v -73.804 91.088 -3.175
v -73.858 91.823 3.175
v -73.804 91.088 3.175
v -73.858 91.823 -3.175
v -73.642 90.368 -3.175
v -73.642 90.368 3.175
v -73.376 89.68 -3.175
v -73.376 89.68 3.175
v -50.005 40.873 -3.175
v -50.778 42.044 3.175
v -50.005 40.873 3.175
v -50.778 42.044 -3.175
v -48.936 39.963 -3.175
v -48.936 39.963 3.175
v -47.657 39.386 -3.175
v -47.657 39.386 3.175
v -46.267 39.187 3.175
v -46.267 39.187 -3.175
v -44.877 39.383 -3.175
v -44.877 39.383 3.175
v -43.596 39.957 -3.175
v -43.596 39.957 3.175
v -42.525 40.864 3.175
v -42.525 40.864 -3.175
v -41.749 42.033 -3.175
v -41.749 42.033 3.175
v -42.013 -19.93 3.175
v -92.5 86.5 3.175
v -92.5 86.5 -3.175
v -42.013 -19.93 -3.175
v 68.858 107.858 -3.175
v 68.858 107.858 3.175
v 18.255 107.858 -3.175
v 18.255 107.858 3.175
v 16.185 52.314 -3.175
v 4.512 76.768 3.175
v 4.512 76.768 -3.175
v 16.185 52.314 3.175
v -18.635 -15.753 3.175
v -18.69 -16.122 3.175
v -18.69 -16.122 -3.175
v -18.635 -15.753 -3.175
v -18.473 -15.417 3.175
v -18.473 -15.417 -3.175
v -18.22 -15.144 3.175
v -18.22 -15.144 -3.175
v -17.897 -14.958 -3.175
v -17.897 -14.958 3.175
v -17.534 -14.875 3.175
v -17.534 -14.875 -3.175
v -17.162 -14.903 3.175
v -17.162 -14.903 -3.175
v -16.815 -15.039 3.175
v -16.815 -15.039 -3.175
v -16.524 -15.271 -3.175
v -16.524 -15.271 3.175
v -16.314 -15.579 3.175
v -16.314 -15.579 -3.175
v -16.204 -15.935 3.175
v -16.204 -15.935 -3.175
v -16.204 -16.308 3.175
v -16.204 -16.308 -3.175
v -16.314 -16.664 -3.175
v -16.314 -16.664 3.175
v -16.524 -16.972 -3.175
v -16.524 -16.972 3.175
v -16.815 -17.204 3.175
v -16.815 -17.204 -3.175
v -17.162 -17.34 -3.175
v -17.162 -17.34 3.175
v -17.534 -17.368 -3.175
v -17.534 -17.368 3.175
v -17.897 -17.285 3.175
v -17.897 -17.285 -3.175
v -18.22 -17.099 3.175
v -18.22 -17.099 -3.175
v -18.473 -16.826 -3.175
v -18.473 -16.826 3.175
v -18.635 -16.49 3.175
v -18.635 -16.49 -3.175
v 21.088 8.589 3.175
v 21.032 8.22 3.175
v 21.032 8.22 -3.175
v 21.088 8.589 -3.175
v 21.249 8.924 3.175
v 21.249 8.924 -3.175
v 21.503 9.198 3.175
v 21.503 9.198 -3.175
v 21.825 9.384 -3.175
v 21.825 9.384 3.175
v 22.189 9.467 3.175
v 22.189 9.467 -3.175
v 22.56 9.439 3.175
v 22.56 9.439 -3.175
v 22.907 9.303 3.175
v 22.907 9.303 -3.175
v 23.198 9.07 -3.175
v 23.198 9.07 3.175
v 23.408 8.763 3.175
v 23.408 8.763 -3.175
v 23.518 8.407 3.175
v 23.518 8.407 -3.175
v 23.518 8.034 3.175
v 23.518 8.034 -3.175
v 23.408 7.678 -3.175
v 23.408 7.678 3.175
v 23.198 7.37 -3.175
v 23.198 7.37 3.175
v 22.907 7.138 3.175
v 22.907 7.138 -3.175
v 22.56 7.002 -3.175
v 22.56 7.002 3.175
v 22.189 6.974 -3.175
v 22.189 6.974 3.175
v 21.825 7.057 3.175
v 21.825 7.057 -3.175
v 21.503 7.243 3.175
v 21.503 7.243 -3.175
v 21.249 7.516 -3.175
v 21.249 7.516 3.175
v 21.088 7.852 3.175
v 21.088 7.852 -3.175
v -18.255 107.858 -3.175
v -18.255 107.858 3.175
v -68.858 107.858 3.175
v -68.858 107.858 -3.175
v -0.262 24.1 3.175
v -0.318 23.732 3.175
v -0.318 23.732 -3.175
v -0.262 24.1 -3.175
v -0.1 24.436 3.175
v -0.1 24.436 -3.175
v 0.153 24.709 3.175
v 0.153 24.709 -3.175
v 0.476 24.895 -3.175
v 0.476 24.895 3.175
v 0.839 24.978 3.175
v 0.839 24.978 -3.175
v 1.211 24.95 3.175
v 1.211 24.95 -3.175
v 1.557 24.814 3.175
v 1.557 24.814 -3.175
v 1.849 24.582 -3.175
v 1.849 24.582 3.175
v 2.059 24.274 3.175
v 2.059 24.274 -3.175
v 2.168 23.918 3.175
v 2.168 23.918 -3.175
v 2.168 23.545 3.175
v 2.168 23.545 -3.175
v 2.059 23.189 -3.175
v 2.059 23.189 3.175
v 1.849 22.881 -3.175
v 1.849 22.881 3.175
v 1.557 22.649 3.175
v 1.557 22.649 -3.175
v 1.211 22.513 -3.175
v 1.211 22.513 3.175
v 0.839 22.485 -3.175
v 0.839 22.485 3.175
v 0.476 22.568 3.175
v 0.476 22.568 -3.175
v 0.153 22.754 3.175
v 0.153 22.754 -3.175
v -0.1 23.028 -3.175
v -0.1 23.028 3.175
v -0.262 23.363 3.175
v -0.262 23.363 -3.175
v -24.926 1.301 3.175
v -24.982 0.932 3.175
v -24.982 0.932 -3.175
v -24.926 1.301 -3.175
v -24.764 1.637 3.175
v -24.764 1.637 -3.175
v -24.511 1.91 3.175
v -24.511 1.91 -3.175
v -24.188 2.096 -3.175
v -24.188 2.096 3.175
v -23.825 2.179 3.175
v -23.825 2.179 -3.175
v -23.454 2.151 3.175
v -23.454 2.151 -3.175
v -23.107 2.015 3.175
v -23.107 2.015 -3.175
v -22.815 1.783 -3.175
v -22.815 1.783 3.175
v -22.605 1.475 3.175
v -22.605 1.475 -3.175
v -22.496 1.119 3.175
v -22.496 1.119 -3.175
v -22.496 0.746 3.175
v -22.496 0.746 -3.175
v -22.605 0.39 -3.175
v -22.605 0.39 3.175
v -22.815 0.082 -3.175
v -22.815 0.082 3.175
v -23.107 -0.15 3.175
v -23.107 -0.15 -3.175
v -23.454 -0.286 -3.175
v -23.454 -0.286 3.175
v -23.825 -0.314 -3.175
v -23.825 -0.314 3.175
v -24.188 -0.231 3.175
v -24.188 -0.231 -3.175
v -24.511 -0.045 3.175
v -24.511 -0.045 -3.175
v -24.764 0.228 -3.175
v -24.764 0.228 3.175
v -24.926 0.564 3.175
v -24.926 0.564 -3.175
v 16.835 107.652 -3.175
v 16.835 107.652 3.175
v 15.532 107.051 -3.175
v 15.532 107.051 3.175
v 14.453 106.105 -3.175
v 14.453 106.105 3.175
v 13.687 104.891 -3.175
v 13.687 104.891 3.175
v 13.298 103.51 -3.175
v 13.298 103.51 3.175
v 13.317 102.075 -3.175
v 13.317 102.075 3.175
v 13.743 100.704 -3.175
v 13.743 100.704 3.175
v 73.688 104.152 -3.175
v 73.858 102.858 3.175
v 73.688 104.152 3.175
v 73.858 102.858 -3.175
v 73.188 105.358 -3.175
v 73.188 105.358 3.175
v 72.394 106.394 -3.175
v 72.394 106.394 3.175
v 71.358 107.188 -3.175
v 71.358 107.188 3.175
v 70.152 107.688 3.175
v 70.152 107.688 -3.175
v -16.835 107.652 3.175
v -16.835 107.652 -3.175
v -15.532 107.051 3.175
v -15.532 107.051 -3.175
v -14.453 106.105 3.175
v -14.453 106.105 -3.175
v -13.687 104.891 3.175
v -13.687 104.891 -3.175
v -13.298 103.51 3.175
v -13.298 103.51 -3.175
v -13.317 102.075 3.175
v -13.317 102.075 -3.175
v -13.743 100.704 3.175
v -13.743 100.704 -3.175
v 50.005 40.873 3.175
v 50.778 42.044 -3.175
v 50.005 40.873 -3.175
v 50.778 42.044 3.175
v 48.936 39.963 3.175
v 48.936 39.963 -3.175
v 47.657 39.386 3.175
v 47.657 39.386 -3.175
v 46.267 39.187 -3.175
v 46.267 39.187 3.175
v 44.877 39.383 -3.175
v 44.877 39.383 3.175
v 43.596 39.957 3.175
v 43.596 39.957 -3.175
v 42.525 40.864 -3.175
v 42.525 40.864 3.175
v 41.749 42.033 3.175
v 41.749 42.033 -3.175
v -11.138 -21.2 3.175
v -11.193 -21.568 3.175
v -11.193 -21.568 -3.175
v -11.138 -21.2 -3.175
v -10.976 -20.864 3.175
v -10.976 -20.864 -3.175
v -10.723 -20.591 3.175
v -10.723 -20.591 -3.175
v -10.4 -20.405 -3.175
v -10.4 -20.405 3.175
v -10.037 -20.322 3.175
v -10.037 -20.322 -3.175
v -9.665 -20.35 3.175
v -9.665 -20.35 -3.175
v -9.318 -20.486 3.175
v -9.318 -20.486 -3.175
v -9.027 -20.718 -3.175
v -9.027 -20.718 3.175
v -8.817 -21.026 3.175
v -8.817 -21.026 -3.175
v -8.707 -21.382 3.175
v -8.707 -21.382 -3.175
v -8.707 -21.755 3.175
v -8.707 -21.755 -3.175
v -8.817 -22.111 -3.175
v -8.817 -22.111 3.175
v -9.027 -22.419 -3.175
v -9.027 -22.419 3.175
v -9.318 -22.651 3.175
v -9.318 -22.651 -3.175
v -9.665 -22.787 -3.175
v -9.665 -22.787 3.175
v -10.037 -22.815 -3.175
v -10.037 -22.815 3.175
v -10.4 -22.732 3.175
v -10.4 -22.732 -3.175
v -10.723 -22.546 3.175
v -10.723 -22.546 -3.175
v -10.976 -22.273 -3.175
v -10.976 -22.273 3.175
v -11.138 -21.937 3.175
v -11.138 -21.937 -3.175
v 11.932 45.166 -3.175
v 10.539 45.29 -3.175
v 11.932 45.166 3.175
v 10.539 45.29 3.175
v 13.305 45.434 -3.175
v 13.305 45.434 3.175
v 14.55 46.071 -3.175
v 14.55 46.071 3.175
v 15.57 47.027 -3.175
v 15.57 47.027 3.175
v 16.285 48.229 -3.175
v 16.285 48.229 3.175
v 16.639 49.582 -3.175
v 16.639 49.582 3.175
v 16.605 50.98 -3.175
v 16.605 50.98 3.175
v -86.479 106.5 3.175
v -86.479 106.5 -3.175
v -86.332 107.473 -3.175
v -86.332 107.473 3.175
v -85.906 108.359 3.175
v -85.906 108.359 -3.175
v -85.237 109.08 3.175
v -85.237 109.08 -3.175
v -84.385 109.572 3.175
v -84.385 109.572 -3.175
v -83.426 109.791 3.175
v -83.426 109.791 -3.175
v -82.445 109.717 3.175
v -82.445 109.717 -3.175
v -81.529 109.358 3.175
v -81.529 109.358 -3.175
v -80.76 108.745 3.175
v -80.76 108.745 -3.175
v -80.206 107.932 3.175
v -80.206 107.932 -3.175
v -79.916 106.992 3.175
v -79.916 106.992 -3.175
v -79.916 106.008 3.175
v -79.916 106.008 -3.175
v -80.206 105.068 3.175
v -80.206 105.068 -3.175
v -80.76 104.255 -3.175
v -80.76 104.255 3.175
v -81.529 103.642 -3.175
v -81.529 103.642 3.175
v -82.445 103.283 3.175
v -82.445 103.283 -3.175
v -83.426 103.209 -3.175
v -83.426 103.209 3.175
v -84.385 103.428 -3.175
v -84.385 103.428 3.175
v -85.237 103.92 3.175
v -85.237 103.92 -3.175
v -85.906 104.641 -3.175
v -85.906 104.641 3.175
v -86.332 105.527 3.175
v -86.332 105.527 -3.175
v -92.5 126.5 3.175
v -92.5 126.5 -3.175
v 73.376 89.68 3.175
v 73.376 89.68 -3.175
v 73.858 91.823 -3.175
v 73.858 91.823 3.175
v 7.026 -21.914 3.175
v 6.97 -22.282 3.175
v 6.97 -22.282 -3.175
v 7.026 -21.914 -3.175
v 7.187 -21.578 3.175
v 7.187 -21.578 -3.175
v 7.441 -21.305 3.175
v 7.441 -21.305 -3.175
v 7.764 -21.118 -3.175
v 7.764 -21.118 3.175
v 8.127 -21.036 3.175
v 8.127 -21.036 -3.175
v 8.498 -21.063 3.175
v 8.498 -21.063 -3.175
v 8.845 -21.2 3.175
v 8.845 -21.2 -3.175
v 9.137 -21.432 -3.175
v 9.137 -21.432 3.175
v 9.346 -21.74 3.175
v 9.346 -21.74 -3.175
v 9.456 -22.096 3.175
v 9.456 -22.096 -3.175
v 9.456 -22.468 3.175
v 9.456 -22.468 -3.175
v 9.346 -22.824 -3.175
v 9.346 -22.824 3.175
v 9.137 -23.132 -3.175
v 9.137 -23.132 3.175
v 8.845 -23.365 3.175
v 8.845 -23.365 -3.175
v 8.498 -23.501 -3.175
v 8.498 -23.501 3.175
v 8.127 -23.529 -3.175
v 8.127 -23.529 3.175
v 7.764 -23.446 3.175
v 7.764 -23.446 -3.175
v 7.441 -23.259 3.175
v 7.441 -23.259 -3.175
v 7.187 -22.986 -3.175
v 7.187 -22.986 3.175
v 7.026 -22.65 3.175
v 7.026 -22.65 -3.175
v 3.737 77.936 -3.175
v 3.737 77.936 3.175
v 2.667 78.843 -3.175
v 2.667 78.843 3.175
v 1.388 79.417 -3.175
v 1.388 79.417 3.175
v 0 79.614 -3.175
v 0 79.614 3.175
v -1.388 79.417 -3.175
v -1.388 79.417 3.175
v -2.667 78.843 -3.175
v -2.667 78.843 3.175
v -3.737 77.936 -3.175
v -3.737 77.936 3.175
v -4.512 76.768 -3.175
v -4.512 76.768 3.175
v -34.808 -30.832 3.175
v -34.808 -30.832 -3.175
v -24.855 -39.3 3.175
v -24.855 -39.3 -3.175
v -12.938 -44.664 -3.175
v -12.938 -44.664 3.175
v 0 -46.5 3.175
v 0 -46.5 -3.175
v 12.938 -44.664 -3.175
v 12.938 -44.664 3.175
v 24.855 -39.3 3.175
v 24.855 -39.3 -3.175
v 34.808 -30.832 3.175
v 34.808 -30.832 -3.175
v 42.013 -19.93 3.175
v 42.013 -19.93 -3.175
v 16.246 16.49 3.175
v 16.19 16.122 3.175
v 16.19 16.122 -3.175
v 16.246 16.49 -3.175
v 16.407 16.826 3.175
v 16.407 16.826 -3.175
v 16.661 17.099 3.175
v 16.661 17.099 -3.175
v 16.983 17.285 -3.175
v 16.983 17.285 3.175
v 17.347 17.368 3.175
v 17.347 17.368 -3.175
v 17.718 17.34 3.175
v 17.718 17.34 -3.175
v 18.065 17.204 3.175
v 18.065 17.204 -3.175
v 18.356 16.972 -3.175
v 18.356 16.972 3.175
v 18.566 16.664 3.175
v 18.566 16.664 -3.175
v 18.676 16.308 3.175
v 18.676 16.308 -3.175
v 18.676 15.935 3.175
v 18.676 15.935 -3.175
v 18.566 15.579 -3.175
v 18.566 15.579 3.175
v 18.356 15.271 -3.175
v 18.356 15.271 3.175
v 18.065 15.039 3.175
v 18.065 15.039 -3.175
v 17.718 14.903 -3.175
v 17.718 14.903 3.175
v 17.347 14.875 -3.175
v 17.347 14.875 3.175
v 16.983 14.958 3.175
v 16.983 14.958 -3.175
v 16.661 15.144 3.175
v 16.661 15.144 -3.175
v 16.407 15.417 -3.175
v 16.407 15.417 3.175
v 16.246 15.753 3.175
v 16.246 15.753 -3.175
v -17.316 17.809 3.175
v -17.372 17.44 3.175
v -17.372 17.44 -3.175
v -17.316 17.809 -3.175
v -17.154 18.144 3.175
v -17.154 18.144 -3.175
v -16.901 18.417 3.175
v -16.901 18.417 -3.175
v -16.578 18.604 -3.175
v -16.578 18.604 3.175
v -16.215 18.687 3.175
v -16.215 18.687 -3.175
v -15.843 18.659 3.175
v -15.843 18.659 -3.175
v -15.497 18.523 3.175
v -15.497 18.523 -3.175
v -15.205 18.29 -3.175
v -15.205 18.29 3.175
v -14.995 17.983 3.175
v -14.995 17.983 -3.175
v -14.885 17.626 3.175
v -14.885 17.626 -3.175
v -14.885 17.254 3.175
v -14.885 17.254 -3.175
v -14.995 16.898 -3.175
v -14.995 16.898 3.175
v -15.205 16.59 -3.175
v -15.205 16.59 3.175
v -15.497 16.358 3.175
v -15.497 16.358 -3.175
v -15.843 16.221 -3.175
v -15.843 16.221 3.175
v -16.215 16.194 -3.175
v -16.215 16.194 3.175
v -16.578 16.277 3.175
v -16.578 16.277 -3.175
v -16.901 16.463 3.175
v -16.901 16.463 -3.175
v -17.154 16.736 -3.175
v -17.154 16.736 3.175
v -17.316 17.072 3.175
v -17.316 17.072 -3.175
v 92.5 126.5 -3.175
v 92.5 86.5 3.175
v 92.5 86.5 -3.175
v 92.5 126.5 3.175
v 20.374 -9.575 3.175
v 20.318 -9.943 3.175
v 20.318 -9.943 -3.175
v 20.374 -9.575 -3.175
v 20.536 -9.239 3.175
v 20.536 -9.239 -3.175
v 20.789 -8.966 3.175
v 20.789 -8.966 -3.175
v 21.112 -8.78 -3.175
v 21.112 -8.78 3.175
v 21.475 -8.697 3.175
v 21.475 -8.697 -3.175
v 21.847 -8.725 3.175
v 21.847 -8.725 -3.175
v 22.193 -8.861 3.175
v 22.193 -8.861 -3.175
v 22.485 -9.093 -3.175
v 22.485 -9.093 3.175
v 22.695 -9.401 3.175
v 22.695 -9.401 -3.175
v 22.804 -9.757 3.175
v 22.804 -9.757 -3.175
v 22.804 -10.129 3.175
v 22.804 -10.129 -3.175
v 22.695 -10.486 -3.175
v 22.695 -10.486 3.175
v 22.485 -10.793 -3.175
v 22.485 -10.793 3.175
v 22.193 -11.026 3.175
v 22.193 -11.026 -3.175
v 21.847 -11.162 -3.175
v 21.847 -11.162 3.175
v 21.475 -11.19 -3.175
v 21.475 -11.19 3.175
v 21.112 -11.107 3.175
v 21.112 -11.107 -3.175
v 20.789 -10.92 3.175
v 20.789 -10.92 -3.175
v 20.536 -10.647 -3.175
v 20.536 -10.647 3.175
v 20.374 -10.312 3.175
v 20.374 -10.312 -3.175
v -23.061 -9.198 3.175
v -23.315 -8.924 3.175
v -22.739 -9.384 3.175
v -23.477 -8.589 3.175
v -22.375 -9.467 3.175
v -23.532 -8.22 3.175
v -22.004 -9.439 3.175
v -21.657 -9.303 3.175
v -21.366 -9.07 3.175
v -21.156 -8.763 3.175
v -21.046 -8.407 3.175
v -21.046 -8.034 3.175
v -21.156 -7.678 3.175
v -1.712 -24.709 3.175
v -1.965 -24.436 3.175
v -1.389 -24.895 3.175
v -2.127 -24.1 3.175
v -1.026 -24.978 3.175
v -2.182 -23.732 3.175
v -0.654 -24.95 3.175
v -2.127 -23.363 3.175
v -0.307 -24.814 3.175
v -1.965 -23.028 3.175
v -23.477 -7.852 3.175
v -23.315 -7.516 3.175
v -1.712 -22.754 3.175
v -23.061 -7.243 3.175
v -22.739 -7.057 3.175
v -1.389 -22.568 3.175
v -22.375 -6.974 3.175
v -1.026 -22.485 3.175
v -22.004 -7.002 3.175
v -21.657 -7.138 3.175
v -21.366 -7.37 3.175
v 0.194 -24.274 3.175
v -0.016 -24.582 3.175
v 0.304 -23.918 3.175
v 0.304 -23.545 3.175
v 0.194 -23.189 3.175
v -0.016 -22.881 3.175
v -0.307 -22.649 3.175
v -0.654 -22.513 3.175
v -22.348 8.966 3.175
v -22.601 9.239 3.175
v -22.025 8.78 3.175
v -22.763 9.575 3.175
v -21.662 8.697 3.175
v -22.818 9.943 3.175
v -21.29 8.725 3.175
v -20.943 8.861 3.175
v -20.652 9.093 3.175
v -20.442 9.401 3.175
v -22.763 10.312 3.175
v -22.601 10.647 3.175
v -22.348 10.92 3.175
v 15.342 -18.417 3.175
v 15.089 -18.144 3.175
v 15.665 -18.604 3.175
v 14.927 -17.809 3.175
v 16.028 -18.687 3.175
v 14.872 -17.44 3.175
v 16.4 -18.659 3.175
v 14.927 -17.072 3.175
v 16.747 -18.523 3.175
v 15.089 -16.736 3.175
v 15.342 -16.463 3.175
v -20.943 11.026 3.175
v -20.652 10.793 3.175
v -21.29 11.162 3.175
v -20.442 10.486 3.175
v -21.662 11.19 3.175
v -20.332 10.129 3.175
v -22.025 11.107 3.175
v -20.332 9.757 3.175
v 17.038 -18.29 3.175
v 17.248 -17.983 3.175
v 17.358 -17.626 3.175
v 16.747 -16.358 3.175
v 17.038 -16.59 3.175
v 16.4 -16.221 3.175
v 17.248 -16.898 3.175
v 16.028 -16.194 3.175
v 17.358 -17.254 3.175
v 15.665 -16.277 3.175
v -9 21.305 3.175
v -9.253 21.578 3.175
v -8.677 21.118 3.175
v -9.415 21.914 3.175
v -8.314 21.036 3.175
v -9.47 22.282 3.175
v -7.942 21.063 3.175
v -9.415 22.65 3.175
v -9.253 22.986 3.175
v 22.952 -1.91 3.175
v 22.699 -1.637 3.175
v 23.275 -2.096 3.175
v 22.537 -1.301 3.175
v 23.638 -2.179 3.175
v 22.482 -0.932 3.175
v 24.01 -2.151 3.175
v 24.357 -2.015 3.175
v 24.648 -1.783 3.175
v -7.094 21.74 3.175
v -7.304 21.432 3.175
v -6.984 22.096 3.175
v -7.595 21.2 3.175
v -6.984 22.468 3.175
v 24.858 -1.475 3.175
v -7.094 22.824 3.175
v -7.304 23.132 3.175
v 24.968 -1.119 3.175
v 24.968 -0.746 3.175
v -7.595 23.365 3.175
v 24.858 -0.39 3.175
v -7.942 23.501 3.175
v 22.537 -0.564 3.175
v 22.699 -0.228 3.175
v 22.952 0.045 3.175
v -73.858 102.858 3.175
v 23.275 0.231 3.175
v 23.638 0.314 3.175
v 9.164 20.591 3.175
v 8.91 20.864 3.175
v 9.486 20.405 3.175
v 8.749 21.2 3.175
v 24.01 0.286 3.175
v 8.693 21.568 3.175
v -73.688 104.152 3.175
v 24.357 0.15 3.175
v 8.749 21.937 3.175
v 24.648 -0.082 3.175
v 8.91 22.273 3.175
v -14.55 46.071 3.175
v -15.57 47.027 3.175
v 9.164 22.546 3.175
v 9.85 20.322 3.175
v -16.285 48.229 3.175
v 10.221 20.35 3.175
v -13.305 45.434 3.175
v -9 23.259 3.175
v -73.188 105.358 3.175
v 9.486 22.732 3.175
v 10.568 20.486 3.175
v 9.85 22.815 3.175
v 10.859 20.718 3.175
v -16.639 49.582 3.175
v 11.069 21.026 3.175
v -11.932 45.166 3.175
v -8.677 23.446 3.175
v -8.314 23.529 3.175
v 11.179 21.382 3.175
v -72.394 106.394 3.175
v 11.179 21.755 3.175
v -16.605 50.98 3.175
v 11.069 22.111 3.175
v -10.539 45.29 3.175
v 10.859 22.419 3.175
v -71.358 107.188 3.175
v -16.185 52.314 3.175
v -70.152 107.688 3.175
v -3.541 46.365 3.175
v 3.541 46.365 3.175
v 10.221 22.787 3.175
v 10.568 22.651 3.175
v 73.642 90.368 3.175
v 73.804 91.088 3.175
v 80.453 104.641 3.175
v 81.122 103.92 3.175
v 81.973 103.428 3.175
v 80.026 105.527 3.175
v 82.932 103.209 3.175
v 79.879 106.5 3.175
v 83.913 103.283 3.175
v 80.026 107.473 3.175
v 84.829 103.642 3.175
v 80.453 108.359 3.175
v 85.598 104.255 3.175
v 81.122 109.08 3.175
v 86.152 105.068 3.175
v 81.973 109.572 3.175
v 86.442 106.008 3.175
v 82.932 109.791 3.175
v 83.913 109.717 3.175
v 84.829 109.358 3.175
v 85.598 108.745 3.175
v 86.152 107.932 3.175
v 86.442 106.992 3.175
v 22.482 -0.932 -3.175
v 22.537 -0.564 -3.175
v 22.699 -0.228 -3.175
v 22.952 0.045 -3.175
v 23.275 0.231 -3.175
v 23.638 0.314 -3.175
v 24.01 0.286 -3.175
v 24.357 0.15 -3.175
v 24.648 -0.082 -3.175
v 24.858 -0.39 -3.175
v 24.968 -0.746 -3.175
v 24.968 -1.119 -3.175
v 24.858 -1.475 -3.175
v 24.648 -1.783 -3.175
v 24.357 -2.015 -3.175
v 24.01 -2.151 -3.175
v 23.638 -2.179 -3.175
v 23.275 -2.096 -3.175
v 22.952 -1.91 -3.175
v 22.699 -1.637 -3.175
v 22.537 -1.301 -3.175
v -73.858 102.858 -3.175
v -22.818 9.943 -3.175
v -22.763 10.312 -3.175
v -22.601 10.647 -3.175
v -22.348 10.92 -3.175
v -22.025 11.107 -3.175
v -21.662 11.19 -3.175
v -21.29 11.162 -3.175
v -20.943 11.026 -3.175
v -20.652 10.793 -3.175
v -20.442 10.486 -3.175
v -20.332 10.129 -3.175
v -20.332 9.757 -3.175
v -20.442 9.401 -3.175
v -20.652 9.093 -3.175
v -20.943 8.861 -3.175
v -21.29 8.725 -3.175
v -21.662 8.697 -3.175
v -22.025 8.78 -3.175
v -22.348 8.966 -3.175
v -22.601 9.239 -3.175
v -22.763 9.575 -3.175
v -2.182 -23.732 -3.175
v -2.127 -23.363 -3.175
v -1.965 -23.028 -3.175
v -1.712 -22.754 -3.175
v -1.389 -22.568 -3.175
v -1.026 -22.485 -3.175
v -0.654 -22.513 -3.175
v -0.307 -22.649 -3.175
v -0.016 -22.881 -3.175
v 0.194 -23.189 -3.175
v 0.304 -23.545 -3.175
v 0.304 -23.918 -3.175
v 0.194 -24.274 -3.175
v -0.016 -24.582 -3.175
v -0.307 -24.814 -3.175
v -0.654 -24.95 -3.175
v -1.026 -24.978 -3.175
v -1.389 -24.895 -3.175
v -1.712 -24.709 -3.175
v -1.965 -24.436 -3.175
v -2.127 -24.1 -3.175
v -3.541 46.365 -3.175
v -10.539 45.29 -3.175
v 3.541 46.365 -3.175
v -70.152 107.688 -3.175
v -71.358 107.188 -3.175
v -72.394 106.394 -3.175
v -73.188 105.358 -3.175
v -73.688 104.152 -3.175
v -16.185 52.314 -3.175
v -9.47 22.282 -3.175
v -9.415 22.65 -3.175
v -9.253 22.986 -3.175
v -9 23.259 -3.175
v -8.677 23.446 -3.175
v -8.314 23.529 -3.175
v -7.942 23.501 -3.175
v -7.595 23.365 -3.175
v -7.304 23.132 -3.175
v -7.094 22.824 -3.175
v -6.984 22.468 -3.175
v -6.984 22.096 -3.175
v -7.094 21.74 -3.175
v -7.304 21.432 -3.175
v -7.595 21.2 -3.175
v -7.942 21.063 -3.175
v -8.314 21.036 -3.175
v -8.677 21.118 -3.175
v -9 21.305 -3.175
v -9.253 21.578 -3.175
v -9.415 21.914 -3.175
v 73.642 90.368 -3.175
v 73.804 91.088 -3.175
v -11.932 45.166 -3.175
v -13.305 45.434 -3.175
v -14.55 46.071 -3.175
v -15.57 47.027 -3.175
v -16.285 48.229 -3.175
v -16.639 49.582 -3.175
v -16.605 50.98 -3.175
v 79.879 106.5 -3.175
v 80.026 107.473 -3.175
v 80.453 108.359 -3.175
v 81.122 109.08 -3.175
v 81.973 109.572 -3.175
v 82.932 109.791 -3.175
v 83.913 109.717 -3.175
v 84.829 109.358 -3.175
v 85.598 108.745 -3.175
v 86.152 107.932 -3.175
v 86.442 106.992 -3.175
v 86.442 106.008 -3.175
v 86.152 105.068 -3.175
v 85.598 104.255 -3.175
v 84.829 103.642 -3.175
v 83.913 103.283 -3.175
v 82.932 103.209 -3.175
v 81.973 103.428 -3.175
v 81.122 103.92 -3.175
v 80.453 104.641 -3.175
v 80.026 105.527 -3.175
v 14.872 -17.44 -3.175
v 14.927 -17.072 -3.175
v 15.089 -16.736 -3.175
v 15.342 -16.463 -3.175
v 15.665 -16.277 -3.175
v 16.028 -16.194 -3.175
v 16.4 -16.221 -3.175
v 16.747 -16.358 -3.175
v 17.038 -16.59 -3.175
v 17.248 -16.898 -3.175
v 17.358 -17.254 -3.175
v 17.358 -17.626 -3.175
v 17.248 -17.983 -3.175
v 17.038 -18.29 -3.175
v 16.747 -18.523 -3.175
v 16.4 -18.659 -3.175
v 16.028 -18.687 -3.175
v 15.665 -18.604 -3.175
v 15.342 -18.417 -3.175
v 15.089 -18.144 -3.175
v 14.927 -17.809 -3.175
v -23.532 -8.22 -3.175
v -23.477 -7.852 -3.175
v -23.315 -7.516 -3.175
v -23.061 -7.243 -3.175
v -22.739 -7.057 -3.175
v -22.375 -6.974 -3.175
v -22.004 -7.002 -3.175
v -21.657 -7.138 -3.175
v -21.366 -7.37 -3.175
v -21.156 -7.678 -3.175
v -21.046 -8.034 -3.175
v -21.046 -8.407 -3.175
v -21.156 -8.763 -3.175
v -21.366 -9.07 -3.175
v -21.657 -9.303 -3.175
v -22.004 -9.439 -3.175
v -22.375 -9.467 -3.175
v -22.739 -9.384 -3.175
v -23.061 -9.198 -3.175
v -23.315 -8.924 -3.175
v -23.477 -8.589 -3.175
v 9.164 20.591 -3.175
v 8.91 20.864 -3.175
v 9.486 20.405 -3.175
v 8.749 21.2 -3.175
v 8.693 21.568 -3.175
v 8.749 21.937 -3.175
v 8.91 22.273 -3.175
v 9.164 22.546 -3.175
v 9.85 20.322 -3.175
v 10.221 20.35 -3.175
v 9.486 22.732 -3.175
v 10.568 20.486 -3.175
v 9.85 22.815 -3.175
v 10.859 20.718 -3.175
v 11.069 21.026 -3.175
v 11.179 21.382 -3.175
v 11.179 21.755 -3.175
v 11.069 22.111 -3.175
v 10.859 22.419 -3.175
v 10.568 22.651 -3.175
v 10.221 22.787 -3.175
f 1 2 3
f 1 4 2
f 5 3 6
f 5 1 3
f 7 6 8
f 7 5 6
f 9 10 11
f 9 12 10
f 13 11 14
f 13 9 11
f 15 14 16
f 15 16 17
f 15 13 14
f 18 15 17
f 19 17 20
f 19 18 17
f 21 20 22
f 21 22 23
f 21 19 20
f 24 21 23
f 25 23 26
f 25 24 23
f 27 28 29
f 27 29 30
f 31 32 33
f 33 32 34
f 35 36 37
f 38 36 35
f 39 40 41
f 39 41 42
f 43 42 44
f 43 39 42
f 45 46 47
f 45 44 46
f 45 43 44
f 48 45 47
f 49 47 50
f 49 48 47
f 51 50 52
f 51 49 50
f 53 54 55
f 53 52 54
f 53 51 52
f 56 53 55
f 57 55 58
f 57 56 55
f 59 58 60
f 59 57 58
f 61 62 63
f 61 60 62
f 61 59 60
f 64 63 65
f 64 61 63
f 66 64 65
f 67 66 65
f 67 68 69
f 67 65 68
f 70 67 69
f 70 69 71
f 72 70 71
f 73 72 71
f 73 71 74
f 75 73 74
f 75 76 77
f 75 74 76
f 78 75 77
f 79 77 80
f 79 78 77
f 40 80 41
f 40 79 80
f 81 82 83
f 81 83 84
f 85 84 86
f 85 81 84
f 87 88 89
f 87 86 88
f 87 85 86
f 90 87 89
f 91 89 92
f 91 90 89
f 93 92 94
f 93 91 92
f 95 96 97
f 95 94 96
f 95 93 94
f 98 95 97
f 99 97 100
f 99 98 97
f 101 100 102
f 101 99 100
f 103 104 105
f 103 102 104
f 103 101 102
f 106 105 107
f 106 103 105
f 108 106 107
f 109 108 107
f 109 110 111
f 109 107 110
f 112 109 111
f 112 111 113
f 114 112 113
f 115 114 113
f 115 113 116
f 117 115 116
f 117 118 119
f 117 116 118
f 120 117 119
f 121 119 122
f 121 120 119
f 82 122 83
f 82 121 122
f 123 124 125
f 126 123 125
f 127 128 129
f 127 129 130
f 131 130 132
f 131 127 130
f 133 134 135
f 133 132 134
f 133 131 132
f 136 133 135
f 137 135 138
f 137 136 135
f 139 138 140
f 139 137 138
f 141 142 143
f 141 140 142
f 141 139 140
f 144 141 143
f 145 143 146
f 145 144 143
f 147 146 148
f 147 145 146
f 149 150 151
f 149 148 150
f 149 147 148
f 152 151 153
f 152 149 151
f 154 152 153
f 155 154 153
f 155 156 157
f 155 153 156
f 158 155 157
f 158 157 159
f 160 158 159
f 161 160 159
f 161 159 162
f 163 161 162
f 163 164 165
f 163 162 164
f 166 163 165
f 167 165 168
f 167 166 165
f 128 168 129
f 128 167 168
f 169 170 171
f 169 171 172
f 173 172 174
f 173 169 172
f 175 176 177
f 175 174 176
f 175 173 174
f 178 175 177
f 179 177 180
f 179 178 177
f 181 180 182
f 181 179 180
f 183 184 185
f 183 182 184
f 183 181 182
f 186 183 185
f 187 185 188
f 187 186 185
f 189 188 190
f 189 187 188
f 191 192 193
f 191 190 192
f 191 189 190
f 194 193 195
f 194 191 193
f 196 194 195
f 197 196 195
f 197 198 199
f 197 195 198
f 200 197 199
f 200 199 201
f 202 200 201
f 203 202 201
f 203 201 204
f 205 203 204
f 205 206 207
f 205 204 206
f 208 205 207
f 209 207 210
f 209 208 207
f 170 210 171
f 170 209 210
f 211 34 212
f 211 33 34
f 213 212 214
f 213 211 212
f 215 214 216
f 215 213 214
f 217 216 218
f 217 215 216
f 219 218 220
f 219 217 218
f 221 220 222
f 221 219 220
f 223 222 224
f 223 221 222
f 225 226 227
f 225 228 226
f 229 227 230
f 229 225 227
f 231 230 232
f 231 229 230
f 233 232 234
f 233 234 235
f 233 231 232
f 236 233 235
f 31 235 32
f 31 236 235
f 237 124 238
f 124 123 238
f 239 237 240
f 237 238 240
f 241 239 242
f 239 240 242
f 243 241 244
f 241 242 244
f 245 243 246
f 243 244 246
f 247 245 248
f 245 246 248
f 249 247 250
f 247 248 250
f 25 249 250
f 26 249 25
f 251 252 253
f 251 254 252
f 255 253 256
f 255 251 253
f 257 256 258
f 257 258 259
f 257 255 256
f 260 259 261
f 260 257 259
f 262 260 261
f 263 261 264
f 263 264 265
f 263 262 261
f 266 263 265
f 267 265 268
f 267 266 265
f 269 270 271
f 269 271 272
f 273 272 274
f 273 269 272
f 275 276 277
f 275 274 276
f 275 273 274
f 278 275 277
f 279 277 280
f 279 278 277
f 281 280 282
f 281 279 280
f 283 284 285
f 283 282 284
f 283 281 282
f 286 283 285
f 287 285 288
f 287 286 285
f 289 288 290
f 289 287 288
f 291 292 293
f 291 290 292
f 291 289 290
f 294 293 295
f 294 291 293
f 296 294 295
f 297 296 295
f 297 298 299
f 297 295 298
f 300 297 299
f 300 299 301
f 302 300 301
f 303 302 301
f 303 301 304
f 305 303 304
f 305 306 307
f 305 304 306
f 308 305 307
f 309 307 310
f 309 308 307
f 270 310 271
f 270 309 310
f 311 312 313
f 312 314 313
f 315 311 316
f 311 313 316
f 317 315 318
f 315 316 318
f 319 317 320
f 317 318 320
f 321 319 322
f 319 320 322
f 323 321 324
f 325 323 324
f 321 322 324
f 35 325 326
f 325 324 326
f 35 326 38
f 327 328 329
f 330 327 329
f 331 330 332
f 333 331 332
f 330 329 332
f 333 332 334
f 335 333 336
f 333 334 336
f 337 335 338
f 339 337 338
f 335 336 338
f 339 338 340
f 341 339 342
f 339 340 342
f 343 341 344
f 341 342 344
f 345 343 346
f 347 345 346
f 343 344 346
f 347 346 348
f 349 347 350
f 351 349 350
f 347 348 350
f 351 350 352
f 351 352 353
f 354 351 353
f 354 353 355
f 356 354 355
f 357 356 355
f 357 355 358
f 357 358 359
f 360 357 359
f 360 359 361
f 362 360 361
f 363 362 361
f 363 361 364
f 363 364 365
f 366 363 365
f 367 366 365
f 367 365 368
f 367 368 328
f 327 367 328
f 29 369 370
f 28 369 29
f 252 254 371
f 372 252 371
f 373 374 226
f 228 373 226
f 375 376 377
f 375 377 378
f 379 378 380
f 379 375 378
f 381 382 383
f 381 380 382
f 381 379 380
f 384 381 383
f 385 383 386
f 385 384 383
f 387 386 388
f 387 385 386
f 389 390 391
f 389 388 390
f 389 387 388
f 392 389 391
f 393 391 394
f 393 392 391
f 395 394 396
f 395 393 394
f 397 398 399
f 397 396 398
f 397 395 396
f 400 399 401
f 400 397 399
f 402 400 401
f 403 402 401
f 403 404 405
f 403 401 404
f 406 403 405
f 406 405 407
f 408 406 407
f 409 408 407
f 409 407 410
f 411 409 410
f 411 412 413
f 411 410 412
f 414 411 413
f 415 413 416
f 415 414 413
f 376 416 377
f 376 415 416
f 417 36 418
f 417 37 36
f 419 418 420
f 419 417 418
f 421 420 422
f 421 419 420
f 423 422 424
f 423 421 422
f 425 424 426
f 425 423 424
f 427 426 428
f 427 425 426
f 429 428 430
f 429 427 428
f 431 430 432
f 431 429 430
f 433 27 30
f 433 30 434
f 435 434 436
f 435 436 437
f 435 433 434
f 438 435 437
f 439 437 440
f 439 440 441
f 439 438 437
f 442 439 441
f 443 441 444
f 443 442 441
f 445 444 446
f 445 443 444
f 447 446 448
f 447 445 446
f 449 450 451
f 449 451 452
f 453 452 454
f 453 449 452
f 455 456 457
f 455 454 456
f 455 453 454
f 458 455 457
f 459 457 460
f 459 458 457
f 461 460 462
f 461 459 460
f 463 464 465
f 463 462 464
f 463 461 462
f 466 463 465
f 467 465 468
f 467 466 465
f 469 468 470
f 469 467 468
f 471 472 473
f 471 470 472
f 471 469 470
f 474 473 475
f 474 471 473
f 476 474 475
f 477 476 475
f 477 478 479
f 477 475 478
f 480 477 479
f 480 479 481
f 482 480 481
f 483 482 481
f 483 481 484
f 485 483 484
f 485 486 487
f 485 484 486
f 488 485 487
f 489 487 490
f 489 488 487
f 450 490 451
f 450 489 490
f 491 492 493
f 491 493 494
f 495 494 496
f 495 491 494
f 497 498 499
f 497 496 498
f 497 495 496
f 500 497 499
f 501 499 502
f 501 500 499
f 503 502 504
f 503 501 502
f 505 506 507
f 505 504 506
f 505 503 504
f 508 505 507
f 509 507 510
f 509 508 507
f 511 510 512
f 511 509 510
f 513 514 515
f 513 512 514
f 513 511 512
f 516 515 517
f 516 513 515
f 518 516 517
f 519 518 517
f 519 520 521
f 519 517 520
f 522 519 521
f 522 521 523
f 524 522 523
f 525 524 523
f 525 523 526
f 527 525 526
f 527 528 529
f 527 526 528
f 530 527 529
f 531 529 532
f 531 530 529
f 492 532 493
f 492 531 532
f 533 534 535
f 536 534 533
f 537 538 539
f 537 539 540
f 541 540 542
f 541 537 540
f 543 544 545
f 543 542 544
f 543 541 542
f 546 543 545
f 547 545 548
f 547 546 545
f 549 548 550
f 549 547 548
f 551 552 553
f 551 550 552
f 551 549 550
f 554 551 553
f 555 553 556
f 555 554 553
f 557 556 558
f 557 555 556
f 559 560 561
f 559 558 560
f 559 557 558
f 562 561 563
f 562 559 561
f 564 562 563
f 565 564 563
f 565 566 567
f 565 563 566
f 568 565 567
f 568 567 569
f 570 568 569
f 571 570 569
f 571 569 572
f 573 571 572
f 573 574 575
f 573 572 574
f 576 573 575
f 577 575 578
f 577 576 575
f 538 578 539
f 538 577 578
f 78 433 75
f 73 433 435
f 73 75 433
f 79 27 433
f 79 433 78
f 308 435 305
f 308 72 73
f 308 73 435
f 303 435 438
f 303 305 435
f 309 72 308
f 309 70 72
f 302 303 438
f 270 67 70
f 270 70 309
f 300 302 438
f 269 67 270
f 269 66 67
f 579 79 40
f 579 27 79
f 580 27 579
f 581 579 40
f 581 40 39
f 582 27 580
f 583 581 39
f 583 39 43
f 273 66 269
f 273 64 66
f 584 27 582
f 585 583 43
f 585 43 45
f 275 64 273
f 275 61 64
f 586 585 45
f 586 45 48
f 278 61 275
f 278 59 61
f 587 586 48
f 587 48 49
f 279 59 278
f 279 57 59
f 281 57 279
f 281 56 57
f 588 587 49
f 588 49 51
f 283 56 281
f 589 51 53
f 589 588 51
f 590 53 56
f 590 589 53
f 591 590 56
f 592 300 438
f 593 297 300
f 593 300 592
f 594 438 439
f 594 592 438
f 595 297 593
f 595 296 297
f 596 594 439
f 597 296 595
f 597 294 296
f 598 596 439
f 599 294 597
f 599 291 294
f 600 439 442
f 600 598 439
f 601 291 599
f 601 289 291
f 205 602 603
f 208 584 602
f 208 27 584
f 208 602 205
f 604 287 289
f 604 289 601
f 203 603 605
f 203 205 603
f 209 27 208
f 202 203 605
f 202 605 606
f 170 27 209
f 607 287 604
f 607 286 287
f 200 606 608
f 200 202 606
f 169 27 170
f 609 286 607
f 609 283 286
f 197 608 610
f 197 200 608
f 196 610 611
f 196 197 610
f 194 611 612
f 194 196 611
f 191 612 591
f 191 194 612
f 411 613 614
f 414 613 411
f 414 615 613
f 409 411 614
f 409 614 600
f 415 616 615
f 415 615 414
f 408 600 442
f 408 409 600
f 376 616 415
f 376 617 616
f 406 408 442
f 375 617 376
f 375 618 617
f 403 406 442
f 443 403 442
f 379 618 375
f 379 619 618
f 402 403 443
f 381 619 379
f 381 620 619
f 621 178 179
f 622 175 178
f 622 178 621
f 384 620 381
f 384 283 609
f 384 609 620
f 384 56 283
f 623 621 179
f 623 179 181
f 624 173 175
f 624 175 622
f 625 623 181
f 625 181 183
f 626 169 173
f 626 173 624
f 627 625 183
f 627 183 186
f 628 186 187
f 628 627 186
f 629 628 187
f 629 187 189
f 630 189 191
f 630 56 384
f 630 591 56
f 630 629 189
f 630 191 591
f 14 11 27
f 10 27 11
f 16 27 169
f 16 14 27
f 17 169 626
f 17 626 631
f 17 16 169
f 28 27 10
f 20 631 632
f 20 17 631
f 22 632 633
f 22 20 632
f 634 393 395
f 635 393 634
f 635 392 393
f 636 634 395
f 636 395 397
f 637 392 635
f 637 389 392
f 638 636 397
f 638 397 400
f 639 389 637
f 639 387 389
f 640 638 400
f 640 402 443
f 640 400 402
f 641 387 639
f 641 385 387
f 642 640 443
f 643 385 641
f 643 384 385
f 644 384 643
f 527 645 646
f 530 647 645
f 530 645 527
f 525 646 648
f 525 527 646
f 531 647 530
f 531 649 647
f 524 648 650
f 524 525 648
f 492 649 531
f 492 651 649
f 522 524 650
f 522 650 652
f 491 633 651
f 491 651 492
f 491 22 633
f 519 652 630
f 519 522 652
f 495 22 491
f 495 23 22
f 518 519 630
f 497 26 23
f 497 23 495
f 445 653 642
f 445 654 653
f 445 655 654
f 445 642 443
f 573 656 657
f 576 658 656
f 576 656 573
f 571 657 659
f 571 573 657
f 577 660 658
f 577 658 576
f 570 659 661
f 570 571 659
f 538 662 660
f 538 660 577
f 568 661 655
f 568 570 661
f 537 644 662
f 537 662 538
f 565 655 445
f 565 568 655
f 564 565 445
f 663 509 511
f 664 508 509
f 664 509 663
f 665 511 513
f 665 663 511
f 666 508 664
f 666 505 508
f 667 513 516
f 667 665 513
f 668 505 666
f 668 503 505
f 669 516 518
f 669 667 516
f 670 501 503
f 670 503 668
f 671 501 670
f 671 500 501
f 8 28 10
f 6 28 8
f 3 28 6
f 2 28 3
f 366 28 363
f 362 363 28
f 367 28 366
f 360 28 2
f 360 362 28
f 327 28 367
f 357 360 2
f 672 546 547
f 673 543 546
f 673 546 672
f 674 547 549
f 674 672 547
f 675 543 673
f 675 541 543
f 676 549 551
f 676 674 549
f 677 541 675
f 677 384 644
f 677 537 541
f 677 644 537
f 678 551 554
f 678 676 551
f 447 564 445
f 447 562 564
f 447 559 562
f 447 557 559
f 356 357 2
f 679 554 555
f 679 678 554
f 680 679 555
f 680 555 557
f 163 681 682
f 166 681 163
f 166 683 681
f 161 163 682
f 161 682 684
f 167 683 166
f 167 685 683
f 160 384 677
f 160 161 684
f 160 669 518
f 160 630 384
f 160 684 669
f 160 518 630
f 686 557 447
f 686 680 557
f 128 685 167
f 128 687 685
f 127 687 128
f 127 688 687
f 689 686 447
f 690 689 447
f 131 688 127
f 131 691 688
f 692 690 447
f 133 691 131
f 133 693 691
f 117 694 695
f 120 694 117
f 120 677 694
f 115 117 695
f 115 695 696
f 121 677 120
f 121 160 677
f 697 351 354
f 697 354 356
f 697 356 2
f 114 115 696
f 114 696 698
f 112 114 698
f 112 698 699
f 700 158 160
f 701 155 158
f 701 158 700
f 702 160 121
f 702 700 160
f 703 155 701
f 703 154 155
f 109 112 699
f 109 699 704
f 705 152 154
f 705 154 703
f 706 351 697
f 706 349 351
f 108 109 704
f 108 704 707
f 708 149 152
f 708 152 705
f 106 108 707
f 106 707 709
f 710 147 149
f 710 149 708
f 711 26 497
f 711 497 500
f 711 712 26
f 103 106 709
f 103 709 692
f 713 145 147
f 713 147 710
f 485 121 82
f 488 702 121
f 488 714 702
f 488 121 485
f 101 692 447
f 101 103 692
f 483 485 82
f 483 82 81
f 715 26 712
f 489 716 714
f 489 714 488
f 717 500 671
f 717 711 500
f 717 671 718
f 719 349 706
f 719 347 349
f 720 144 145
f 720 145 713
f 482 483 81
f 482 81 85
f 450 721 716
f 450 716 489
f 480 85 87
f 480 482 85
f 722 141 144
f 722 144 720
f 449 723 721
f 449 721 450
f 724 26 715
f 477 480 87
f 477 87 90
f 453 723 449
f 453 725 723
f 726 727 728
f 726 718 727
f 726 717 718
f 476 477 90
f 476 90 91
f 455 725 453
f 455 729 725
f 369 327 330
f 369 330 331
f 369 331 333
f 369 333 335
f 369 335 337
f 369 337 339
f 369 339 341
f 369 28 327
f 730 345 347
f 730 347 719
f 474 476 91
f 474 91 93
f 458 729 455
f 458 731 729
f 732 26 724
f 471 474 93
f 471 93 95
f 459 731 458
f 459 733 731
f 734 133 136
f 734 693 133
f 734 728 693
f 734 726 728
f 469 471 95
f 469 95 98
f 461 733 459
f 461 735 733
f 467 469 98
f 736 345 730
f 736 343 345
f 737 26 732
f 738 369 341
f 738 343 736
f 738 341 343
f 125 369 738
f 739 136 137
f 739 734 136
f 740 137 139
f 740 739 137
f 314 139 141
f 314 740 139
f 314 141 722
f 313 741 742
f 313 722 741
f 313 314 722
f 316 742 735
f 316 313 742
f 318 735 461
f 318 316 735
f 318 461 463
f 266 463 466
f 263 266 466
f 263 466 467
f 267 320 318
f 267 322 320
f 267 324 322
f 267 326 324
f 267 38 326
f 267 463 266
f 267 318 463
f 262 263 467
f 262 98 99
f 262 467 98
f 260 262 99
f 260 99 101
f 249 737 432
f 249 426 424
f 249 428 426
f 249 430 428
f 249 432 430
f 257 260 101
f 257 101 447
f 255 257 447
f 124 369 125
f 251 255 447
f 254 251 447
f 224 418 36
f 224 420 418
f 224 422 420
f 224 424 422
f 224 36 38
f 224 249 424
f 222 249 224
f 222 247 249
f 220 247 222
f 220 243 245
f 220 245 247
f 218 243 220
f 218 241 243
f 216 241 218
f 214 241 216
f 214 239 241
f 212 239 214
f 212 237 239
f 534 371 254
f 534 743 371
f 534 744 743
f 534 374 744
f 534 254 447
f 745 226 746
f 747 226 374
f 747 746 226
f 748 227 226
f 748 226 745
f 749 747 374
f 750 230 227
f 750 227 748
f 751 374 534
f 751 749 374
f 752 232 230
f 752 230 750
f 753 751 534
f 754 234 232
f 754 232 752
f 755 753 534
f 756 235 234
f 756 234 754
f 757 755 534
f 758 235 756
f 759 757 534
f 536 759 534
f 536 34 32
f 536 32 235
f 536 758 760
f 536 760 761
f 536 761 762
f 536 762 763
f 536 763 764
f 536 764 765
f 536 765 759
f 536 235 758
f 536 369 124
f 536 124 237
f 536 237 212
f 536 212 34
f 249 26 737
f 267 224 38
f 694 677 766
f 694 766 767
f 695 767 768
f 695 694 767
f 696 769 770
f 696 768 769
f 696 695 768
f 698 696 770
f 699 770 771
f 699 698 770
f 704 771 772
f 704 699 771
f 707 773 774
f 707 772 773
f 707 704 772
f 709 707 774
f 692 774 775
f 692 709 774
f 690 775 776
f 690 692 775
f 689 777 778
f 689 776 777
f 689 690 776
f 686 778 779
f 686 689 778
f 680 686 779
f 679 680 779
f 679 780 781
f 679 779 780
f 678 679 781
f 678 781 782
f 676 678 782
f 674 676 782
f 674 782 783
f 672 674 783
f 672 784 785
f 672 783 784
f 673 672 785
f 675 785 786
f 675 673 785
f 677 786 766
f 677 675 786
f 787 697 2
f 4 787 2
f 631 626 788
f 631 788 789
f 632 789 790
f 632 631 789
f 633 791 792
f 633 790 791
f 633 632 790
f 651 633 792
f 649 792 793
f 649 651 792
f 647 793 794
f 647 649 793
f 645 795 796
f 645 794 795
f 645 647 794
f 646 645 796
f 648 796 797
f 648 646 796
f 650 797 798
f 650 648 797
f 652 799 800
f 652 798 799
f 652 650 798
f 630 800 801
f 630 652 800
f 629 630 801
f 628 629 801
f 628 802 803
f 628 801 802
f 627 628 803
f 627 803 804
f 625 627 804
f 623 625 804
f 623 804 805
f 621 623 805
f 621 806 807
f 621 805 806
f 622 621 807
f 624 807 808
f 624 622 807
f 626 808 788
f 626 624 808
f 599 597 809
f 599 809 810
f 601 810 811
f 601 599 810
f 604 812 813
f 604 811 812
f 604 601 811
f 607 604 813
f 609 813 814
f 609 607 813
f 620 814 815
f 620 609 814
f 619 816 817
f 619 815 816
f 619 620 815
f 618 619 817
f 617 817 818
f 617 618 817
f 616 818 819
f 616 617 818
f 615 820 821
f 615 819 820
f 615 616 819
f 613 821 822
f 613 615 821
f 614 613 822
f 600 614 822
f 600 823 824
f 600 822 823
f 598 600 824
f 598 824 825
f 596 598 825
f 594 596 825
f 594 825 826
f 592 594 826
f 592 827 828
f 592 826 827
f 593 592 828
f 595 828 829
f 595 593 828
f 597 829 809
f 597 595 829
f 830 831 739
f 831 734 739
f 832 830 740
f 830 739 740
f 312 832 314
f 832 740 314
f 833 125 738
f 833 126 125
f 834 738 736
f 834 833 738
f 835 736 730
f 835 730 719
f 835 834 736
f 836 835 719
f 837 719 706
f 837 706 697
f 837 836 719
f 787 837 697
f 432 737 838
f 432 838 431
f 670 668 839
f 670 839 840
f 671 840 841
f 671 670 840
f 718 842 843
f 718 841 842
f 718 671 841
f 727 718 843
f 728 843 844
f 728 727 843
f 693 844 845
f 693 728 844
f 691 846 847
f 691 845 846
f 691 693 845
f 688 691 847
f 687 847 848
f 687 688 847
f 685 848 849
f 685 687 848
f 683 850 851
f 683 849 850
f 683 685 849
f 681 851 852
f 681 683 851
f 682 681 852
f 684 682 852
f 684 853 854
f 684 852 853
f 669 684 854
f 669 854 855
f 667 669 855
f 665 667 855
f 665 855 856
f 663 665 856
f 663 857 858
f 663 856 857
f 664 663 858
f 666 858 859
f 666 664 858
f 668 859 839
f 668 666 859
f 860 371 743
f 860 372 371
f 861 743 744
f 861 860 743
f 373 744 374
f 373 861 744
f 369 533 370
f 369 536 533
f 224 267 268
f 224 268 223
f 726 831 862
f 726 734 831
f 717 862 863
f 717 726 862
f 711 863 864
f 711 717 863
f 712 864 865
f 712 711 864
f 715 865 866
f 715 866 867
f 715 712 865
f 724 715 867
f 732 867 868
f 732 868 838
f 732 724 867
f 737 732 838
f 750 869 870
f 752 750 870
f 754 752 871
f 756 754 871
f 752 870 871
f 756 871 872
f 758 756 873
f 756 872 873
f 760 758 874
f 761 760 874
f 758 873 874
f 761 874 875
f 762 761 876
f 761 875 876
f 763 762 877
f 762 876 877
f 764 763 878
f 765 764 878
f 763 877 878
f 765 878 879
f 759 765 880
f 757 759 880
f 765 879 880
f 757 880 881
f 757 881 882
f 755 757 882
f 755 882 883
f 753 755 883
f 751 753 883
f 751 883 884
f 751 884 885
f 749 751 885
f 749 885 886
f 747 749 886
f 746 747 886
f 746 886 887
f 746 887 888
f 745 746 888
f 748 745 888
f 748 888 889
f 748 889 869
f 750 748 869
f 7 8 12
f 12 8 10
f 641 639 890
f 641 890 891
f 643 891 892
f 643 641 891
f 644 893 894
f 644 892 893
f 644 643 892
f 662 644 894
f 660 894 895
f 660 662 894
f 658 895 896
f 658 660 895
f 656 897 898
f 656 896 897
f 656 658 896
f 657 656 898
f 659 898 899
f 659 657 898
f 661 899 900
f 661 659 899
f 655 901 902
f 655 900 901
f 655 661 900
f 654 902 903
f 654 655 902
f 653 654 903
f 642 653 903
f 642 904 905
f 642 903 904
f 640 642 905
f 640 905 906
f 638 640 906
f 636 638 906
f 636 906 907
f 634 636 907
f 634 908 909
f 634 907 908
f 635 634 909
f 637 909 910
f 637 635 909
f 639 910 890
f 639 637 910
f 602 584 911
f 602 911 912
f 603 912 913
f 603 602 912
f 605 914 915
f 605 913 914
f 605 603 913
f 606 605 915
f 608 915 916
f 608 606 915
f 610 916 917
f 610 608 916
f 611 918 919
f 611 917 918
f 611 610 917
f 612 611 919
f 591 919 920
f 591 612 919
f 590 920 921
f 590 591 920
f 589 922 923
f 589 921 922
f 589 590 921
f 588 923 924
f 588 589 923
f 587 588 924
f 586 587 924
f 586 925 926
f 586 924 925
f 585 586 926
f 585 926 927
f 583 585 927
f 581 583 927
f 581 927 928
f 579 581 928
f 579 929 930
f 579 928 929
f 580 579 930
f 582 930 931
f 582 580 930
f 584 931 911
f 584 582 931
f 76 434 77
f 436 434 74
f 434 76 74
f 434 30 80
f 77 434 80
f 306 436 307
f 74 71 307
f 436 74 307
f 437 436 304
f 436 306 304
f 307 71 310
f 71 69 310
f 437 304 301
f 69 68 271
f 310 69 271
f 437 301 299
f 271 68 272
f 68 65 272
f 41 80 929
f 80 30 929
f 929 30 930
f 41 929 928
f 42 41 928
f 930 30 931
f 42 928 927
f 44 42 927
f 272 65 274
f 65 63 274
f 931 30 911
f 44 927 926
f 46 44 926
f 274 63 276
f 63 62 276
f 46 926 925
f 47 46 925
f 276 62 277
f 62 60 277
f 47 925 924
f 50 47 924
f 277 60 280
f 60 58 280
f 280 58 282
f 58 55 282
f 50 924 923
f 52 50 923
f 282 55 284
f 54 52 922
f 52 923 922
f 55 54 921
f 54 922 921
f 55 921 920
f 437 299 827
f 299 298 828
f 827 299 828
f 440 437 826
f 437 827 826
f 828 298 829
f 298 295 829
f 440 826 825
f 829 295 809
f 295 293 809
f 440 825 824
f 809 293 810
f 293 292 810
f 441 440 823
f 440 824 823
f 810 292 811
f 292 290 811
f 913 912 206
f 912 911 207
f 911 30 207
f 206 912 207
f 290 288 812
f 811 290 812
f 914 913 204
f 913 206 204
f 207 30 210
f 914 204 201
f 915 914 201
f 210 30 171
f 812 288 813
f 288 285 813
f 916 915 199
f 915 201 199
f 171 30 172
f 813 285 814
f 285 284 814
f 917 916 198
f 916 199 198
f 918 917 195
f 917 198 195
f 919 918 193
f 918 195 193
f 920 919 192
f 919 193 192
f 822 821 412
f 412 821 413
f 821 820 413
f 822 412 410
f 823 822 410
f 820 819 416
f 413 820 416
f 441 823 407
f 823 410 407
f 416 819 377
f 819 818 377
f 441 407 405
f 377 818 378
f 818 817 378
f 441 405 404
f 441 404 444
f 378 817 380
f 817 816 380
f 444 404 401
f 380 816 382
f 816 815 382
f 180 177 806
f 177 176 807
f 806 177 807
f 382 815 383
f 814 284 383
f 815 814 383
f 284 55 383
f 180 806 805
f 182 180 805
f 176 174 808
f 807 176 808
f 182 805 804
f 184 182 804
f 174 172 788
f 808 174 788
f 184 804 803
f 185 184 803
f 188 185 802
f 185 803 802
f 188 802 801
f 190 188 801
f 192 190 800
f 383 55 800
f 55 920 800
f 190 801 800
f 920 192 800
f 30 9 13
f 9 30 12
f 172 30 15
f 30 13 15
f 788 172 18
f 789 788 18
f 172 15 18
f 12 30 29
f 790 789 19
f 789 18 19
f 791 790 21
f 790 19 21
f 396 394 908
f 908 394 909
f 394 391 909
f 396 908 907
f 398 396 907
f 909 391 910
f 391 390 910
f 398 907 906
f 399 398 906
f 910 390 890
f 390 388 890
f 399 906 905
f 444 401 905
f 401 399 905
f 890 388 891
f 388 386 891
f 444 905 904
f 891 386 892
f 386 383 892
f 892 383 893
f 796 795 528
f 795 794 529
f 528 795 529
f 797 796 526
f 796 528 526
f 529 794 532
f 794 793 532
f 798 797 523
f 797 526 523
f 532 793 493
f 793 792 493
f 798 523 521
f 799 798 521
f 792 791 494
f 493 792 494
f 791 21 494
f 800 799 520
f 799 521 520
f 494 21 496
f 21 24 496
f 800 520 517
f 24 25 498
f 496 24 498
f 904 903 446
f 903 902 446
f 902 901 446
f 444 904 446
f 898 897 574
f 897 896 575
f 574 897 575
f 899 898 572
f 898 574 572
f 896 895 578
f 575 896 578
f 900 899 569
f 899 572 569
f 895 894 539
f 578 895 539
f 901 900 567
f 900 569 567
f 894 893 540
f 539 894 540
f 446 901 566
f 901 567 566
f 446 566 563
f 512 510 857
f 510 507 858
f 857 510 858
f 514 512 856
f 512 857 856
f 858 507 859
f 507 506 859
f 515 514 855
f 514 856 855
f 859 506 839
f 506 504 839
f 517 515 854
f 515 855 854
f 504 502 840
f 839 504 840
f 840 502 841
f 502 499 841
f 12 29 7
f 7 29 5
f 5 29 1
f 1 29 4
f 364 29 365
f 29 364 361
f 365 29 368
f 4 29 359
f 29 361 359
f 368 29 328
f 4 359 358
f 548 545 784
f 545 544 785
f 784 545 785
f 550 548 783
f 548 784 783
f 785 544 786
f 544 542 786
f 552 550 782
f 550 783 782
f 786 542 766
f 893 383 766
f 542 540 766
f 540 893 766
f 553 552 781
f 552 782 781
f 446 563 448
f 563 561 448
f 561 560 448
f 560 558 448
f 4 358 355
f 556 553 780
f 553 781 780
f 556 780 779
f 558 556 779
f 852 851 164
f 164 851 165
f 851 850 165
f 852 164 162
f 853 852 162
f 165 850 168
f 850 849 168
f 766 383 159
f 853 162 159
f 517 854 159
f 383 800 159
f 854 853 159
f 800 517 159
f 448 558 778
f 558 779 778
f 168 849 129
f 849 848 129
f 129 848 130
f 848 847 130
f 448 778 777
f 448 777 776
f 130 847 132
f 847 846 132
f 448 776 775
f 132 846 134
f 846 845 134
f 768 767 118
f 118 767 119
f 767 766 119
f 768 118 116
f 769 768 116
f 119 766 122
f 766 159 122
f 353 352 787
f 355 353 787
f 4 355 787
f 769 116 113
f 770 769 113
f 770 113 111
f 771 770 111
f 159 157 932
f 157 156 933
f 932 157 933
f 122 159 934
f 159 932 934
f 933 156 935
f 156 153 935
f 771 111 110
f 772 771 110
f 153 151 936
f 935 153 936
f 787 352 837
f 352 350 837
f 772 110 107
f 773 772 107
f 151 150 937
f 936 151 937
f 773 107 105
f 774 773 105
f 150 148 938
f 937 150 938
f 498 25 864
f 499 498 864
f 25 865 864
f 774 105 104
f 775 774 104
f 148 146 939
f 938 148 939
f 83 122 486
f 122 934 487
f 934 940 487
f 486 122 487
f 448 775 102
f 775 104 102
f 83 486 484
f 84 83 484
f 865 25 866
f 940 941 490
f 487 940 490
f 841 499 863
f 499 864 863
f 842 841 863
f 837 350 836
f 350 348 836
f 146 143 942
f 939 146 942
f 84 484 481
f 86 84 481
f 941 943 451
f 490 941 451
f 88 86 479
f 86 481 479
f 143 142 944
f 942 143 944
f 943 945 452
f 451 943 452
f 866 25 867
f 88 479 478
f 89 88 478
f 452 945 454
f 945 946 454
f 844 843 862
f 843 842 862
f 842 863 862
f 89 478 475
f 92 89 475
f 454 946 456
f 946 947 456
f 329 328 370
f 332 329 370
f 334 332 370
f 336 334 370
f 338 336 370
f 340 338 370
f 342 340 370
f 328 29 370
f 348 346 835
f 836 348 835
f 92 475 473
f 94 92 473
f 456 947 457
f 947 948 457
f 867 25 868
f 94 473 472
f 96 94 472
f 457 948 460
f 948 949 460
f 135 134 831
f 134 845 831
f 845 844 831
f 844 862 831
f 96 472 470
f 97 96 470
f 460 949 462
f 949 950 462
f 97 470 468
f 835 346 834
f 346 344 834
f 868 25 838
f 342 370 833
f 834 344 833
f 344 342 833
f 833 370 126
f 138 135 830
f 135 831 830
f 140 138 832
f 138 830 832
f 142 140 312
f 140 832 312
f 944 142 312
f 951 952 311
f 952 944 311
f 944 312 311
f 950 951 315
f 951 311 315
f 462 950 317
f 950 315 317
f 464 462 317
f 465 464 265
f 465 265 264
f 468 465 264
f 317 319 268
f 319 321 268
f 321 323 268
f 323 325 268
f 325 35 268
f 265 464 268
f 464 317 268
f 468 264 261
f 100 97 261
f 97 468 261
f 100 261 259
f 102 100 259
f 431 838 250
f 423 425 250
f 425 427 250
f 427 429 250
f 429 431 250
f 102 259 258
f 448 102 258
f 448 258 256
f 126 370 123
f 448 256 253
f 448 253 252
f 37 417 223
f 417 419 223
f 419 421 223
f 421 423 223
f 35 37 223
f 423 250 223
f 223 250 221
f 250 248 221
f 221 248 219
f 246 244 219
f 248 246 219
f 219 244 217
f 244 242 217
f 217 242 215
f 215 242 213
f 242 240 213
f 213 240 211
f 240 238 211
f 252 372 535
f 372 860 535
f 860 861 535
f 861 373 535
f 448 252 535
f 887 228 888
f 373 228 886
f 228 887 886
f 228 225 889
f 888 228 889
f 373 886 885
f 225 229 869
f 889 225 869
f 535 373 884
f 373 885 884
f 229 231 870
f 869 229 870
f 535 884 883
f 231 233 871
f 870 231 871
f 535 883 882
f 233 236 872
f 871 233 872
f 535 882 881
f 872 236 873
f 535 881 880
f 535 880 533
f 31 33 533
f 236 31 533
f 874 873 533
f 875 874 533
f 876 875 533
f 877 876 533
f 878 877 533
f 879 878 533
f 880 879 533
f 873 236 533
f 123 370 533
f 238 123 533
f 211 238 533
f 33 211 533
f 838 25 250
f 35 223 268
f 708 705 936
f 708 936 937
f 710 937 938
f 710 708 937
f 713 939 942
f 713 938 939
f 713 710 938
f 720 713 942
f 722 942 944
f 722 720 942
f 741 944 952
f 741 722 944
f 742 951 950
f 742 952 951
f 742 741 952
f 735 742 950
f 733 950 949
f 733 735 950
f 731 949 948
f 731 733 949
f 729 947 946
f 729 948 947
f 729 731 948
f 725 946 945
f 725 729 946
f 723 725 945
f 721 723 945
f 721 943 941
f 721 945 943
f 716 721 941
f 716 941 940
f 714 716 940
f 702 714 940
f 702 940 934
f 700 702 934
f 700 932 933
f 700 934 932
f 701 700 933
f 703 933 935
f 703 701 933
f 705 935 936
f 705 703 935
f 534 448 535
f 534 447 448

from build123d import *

# Parameters (mm, degrees)
BOSS_EXTRUDE1_DEPTH     = 3.175
CUT_EXTRUDE2_DEPTH      = 157.840117636
CUT_EXTRUDE2_DEPTH_BACK = 157.840117636
SKETCH3_R               = 1.25
CUT_EXTRUDE3_DEPTH      = 157.840117636
CUT_EXTRUDE3_DEPTH_BACK = 157.840117636
BOSS_EXTRUDE2_DEPTH     = 6.35
FILLET1_R               = 5
M6_CLEARANCE_HOLE1_D    = 6.6


with BuildPart() as part:
    # Sketch1 → Boss-Extrude1 (new, symmetric)
    with BuildSketch(Plane.XY):
        with BuildLine():
            Line((92.5, 126.5), (-92.5, 126.5))
            Line((-92.5, 126.5), (-92.5, 86.5))
            Line((-92.5, 86.5), (-42.012601066, -19.929660099))
            ThreePointArc((-42.012601066, -19.929660099), (0, -46.5), (42.012601066, -19.929660099))
            Line((42.012601066, -19.929660099), (92.5, 86.5))
            Line((92.5, 86.5), (92.5, 126.5))
        make_face()
    extrude(amount=BOSS_EXTRUDE1_DEPTH, both=True)

    # Sketch3 → Cut-Extrude2 (cut, two sides: drawn at the far end of the back side and taken through both)
    with BuildSketch(Plane(origin=(0, 0, -3.175), x_dir=(-1, 0, 0), z_dir=(0, 0, -1)).offset(-CUT_EXTRUDE2_DEPTH_BACK)):
        with Locations((17.440159599, -16.121517706)):
            Circle(SKETCH3_R)
        with Locations((22.282044228, -8.220280106)):
            Circle(SKETCH3_R)
        with Locations((9.943168767, -21.568400378)):
            Circle(SKETCH3_R)
        with Locations((0.932420624, -23.731689611)):
            Circle(SKETCH3_R)
        with Locations((-8.220280106, -22.282044228)):
            Circle(SKETCH3_R)
        with Locations((-16.121517706, -17.440159599)):
            Circle(SKETCH3_R)
        with Locations((-21.568400378, -9.943168767)):
            Circle(SKETCH3_R)
        with Locations((-23.731689611, -0.932420624)):
            Circle(SKETCH3_R)
        with Locations((-22.282044228, 8.220280106)):
            Circle(SKETCH3_R)
        with Locations((-17.440159599, 16.121517706)):
            Circle(SKETCH3_R)
        with Locations((-9.943168767, 21.568400378)):
            Circle(SKETCH3_R)
        with Locations((-0.932420624, 23.731689611)):
            Circle(SKETCH3_R)
        with Locations((8.220280106, 22.282044228)):
            Circle(SKETCH3_R)
        with Locations((16.121517706, 17.440159599)):
            Circle(SKETCH3_R)
        with Locations((21.568400378, 9.943168767)):
            Circle(SKETCH3_R)
        with Locations((23.731689611, 0.932420624)):
            Circle(SKETCH3_R)
    extrude(amount=CUT_EXTRUDE2_DEPTH + CUT_EXTRUDE2_DEPTH_BACK, mode=Mode.SUBTRACT)

    # Sketch4 → Cut-Extrude3 (cut, two sides: drawn at the far end of the back side and taken through both)
    with BuildSketch(Plane(origin=(0, 0, -3.175), x_dir=(-1, 0, 0), z_dir=(0, 0, -1)).offset(-CUT_EXTRUDE3_DEPTH_BACK)):
        with BuildLine():
            Line((-41.126950817, 21.698477285), (-73.85821292, 90.697419076))
            Line((-73.85821292, 90.697419076), (-73.85821292, 107.85821292))
            Line((-73.85821292, 107.85821292), (73.85821292, 107.85821292))
            Line((73.85821292, 107.85821292), (73.85821292, 90.697419076))
            Line((73.85821292, 90.697419076), (41.126950817, 21.698477285))
            ThreePointArc((41.126950817, 21.698477285), (0, 46.5), (-41.126950817, 21.698477285))
        make_face()
    extrude(amount=CUT_EXTRUDE3_DEPTH + CUT_EXTRUDE3_DEPTH_BACK, mode=Mode.SUBTRACT)

    # Sketch6 → Boss-Extrude2 (add)
    with BuildSketch(Plane.XY.offset(3.175)):
        Polygon((-32.71522073, 17.68327451), (0, 86.220686434), (32.71522073, 17.68327451), (49.538680905, 25.71368006), (10.328321936, 107.85821292), (-10.328321936, 107.85821292), (-49.538680905, 25.71368006), align=None)
    extrude(amount=-BOSS_EXTRUDE2_DEPTH)

    # Fillet1
    fillet1_edges = [part.edges().sort_by_distance(p)[0] for p in [
        (73.85821292, 90.697419076, 0),
        (73.85821292, 107.85821292, 0),
        (-73.85821292, 107.85821292, 0),
        (-73.85821292, 90.697419076, 0),
        (-46.275048201, 32.550893259, 0),
        (-21.466818467, 41.248341844, 0),
        (21.466818467, 41.248341844, 0),
        (0, 86.220686434, 0),
        (10.328321936, 107.85821292, 0),
        (-10.328321936, 107.85821292, 0),
        (46.275048201, 32.550893259, 0),
    ]]
    fillet(fillet1_edges, radius=FILLET1_R)

    # M6 Clearance Hole1 (through all)
    with Locations(Plane.XY.offset(3.175)):
        with Locations((83.17910646, 106.5), (-83.17910646, 106.5)):
            Hole(M6_CLEARANCE_HOLE1_D / 2)


solid = part.part
